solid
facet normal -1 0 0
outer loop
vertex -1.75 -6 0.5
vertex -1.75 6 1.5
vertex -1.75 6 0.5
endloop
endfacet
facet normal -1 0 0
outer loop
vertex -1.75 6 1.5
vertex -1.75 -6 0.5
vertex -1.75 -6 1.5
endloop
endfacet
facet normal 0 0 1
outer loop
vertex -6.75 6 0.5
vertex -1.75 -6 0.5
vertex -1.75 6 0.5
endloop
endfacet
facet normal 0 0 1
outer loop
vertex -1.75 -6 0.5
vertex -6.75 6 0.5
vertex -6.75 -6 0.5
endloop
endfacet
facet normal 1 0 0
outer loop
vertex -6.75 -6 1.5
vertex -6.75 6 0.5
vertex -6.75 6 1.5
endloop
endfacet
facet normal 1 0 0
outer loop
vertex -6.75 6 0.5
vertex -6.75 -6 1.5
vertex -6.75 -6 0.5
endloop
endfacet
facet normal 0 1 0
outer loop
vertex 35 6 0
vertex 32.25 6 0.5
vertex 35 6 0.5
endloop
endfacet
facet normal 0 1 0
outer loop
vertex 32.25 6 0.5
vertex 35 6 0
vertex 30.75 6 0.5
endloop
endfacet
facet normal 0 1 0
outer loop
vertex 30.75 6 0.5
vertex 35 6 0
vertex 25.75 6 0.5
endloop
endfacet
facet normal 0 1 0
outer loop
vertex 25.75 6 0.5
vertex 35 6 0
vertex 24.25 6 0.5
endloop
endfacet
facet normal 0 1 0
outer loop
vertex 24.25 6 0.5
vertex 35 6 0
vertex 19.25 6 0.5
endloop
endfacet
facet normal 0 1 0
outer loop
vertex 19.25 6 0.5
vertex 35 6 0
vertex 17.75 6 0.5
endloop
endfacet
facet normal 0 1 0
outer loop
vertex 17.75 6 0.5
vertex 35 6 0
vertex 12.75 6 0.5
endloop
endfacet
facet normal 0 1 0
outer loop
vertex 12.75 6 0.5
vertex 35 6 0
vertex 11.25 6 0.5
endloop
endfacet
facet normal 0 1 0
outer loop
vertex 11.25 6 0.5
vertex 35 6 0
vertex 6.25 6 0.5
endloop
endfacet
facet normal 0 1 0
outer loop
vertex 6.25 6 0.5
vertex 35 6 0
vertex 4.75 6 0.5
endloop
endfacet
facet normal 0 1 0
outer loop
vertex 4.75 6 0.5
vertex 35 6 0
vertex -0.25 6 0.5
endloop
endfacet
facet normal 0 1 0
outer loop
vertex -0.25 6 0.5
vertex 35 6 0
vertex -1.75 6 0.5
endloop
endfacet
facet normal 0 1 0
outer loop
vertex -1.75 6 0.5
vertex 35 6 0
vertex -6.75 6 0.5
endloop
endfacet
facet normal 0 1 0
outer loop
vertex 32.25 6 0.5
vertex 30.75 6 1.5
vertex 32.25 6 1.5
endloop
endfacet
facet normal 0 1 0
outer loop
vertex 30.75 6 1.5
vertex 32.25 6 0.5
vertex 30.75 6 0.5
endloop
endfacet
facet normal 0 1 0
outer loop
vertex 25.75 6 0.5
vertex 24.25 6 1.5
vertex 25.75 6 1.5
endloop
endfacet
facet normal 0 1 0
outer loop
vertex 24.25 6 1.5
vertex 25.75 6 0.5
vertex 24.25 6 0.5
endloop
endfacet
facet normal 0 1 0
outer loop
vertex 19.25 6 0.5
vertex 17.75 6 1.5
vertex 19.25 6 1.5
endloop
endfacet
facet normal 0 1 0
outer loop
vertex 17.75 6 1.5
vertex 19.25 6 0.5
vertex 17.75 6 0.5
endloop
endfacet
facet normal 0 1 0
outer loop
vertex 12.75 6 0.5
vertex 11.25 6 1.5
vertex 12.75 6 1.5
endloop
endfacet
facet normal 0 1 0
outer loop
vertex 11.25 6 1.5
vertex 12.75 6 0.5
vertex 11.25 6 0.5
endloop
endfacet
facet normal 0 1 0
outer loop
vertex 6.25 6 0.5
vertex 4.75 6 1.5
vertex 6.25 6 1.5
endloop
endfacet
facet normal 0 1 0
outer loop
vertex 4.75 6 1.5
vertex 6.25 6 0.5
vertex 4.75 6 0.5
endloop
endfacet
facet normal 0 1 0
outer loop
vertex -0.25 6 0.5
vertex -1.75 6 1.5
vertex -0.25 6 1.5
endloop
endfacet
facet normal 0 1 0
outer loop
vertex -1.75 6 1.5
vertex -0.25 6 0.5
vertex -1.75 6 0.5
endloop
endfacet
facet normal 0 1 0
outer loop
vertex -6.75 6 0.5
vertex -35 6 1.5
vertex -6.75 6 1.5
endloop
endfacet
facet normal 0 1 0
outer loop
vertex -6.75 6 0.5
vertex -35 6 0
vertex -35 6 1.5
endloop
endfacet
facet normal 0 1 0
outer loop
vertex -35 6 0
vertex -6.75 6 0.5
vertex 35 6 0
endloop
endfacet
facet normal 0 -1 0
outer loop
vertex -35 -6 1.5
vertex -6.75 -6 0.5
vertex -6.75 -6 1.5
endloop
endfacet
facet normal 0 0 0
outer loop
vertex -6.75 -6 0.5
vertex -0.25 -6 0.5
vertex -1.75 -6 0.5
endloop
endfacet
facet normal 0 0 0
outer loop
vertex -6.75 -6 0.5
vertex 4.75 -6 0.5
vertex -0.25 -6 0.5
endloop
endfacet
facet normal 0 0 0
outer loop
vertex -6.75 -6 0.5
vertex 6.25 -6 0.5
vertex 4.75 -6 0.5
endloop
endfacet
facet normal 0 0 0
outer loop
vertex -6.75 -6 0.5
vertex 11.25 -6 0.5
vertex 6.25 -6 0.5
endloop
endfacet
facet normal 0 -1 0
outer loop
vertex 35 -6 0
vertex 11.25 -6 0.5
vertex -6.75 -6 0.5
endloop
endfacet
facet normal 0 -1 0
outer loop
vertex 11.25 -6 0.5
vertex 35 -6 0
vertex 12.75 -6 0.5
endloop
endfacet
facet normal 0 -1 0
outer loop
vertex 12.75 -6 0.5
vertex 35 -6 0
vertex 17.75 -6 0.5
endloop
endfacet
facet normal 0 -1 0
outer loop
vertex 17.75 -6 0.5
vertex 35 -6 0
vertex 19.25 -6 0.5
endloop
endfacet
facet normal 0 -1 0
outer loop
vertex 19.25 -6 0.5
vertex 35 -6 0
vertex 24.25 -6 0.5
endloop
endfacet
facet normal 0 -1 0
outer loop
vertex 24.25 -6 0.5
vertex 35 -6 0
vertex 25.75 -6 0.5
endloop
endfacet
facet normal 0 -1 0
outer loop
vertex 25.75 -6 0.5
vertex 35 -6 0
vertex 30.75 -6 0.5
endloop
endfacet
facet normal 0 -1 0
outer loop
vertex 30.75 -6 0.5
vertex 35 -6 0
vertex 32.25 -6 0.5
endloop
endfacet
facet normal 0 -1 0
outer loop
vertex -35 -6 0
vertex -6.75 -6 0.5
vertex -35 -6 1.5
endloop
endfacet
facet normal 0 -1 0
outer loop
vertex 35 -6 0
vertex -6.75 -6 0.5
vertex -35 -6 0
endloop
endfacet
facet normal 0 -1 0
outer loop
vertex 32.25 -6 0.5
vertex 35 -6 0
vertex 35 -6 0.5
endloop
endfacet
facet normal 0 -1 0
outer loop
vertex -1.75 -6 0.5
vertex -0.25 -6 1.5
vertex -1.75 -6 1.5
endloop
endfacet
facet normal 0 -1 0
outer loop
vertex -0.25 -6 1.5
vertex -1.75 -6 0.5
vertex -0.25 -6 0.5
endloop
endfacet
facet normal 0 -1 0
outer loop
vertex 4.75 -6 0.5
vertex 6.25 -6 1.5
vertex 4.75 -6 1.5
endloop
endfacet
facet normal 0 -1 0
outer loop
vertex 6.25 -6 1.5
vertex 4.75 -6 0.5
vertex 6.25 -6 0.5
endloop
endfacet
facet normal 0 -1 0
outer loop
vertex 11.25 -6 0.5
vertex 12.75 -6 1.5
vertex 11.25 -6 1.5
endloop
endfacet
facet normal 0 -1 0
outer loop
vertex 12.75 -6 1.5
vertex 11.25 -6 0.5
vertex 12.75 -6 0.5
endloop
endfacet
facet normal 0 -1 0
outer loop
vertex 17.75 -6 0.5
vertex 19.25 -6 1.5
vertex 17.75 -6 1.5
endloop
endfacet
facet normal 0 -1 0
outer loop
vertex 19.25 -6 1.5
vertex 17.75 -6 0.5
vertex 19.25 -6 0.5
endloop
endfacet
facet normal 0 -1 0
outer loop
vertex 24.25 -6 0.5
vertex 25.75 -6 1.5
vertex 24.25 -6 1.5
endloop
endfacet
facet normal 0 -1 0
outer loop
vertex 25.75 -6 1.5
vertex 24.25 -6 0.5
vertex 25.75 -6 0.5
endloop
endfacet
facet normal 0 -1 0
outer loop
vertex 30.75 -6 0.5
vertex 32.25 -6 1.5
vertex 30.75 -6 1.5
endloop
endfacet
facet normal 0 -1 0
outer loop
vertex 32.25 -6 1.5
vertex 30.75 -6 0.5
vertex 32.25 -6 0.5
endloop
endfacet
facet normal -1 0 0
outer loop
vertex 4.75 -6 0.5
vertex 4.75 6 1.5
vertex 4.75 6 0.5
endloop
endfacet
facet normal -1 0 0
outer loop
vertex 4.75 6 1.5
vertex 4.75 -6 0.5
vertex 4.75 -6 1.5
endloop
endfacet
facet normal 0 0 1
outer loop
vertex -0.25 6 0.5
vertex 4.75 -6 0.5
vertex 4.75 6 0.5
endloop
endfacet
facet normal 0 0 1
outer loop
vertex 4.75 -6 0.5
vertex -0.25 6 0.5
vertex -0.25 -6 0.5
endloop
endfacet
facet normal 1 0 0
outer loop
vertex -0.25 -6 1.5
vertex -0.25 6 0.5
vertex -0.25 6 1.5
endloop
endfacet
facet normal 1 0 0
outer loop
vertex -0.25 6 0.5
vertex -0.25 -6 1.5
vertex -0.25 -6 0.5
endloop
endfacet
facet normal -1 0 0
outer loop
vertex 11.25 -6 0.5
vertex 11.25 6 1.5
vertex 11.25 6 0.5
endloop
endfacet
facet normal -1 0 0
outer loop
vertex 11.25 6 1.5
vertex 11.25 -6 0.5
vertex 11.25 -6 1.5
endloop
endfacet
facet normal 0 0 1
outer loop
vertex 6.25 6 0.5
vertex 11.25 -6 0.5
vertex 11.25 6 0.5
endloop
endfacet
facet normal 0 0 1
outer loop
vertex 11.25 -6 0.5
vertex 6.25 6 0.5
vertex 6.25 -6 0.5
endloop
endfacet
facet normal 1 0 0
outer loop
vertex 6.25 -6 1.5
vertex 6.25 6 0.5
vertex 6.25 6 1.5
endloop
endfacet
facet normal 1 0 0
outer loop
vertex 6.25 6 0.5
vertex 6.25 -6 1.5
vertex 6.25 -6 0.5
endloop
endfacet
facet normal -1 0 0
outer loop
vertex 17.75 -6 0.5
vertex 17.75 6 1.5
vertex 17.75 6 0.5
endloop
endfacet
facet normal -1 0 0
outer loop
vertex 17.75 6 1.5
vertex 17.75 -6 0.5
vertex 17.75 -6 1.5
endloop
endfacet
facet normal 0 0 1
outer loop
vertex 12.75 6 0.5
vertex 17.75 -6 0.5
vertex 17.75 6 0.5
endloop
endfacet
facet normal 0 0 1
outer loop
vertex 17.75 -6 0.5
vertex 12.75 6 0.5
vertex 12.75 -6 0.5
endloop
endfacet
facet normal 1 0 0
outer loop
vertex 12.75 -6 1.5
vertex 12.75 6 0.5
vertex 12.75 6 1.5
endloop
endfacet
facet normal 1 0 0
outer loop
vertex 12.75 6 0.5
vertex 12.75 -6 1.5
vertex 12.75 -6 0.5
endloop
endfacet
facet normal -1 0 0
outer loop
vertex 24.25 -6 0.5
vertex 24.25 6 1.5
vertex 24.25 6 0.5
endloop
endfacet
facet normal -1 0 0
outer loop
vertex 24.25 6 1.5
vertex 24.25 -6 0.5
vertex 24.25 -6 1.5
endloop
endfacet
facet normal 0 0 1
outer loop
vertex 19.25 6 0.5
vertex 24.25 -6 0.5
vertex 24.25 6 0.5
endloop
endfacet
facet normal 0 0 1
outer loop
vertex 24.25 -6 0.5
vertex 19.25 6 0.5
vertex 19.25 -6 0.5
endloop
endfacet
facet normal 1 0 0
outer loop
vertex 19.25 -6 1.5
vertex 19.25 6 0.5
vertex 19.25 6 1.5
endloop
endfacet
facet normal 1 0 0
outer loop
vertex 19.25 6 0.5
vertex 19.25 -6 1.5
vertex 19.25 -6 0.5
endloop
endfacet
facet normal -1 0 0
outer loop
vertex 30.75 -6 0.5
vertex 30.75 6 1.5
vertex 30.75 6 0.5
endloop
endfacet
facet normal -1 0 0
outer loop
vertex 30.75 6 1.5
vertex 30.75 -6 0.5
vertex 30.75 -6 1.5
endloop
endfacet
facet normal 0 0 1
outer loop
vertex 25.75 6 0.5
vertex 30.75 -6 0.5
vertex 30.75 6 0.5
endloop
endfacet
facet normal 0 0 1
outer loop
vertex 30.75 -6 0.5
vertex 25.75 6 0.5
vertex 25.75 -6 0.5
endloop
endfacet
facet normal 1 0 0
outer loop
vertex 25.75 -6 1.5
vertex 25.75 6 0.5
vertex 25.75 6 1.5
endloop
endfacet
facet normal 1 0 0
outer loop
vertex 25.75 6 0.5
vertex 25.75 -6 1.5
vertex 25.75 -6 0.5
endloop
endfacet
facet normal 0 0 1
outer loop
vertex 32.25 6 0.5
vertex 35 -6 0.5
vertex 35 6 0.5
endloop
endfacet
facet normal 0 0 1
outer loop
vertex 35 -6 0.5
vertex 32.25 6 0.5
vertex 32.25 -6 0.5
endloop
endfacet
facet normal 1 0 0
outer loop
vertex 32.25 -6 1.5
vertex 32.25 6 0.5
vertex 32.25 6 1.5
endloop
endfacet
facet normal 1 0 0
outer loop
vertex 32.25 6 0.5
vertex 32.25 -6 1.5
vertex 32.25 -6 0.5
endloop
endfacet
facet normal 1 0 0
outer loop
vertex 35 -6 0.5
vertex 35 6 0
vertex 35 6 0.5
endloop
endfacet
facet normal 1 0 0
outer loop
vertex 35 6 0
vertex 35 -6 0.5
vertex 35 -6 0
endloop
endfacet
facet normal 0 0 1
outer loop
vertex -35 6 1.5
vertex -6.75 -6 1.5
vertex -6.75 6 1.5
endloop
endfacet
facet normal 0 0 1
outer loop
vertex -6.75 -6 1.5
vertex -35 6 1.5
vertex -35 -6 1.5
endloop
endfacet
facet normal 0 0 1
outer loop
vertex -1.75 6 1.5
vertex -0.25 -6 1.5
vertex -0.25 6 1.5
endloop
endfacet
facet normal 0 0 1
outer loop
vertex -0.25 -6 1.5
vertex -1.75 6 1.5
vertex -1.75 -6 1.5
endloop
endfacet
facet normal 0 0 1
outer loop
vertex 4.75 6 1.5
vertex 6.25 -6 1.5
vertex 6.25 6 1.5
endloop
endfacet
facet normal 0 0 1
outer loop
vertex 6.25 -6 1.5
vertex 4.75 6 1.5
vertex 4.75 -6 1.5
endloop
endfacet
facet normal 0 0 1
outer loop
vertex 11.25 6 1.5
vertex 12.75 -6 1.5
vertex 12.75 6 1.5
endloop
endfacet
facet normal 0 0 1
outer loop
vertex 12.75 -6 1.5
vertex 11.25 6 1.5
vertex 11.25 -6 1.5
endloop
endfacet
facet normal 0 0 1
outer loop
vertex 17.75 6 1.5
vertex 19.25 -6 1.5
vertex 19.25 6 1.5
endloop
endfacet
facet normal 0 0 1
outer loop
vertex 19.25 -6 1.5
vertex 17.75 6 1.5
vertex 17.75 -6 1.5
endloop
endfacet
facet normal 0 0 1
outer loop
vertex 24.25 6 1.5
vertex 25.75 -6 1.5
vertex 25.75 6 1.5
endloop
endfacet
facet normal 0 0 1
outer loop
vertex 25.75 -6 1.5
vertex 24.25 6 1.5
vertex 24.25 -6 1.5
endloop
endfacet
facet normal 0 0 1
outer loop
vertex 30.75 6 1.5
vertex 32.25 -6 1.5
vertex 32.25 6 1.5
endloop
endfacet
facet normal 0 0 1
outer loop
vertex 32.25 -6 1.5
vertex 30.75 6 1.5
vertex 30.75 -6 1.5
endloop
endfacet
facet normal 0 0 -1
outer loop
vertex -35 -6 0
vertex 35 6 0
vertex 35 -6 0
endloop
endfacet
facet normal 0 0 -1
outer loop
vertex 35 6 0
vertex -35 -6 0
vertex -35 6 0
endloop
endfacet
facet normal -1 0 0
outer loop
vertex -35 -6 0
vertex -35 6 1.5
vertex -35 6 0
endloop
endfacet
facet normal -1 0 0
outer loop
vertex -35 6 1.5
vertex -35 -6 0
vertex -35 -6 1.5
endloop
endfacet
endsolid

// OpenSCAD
// 10-well comb for casting agarose gels, printed lying flat
// Units: mm. Print orientation: flat on bed, teeth pointing -Y.

// ---------- Parameters ----------
spine_len      = 70;    // spine (back bar) length along X
spine_wid      = 12;    // spine width along Y
plate_thk      = 1.5;   // plate thickness along Z

tooth_count    = 10;    // number of teeth
tooth_w        = 5.0;   // tooth width along X
tooth_len      = 12;    // tooth length along Y
tooth_gap      = 1.5;   // gap between neighbouring teeth along X

eps            = 0.5;   // cutter overshoot past top/bottom faces
$fn            = 64;    // curve resolution (no curves here, set per rules)

// ---------- Derived ----------
row_start_x = -(tooth_count - 1) * tooth_gap / 2;  // first tooth centre X
row_end_x   = row_start_x + tooth_count * tooth_w + (tooth_count - 1) * tooth_gap;  // last tooth centre X + half pitch

// ---------- Model ----------
difference() {
    // Base plate with spine
    translate([-spine_len / 2, -spine_wid / 2, 0])
        cube([spine_len, spine_wid, plate_thk]);

    // Teeth, row centred on spine in X
    for (i = [0 : tooth_count - 1]) {
        translate([row_start_x + i * (tooth_w + tooth_gap), -tooth_len / 2, eps])
            cube([tooth_w, tooth_len, plate_thk + 2 * eps]);
    }
}
